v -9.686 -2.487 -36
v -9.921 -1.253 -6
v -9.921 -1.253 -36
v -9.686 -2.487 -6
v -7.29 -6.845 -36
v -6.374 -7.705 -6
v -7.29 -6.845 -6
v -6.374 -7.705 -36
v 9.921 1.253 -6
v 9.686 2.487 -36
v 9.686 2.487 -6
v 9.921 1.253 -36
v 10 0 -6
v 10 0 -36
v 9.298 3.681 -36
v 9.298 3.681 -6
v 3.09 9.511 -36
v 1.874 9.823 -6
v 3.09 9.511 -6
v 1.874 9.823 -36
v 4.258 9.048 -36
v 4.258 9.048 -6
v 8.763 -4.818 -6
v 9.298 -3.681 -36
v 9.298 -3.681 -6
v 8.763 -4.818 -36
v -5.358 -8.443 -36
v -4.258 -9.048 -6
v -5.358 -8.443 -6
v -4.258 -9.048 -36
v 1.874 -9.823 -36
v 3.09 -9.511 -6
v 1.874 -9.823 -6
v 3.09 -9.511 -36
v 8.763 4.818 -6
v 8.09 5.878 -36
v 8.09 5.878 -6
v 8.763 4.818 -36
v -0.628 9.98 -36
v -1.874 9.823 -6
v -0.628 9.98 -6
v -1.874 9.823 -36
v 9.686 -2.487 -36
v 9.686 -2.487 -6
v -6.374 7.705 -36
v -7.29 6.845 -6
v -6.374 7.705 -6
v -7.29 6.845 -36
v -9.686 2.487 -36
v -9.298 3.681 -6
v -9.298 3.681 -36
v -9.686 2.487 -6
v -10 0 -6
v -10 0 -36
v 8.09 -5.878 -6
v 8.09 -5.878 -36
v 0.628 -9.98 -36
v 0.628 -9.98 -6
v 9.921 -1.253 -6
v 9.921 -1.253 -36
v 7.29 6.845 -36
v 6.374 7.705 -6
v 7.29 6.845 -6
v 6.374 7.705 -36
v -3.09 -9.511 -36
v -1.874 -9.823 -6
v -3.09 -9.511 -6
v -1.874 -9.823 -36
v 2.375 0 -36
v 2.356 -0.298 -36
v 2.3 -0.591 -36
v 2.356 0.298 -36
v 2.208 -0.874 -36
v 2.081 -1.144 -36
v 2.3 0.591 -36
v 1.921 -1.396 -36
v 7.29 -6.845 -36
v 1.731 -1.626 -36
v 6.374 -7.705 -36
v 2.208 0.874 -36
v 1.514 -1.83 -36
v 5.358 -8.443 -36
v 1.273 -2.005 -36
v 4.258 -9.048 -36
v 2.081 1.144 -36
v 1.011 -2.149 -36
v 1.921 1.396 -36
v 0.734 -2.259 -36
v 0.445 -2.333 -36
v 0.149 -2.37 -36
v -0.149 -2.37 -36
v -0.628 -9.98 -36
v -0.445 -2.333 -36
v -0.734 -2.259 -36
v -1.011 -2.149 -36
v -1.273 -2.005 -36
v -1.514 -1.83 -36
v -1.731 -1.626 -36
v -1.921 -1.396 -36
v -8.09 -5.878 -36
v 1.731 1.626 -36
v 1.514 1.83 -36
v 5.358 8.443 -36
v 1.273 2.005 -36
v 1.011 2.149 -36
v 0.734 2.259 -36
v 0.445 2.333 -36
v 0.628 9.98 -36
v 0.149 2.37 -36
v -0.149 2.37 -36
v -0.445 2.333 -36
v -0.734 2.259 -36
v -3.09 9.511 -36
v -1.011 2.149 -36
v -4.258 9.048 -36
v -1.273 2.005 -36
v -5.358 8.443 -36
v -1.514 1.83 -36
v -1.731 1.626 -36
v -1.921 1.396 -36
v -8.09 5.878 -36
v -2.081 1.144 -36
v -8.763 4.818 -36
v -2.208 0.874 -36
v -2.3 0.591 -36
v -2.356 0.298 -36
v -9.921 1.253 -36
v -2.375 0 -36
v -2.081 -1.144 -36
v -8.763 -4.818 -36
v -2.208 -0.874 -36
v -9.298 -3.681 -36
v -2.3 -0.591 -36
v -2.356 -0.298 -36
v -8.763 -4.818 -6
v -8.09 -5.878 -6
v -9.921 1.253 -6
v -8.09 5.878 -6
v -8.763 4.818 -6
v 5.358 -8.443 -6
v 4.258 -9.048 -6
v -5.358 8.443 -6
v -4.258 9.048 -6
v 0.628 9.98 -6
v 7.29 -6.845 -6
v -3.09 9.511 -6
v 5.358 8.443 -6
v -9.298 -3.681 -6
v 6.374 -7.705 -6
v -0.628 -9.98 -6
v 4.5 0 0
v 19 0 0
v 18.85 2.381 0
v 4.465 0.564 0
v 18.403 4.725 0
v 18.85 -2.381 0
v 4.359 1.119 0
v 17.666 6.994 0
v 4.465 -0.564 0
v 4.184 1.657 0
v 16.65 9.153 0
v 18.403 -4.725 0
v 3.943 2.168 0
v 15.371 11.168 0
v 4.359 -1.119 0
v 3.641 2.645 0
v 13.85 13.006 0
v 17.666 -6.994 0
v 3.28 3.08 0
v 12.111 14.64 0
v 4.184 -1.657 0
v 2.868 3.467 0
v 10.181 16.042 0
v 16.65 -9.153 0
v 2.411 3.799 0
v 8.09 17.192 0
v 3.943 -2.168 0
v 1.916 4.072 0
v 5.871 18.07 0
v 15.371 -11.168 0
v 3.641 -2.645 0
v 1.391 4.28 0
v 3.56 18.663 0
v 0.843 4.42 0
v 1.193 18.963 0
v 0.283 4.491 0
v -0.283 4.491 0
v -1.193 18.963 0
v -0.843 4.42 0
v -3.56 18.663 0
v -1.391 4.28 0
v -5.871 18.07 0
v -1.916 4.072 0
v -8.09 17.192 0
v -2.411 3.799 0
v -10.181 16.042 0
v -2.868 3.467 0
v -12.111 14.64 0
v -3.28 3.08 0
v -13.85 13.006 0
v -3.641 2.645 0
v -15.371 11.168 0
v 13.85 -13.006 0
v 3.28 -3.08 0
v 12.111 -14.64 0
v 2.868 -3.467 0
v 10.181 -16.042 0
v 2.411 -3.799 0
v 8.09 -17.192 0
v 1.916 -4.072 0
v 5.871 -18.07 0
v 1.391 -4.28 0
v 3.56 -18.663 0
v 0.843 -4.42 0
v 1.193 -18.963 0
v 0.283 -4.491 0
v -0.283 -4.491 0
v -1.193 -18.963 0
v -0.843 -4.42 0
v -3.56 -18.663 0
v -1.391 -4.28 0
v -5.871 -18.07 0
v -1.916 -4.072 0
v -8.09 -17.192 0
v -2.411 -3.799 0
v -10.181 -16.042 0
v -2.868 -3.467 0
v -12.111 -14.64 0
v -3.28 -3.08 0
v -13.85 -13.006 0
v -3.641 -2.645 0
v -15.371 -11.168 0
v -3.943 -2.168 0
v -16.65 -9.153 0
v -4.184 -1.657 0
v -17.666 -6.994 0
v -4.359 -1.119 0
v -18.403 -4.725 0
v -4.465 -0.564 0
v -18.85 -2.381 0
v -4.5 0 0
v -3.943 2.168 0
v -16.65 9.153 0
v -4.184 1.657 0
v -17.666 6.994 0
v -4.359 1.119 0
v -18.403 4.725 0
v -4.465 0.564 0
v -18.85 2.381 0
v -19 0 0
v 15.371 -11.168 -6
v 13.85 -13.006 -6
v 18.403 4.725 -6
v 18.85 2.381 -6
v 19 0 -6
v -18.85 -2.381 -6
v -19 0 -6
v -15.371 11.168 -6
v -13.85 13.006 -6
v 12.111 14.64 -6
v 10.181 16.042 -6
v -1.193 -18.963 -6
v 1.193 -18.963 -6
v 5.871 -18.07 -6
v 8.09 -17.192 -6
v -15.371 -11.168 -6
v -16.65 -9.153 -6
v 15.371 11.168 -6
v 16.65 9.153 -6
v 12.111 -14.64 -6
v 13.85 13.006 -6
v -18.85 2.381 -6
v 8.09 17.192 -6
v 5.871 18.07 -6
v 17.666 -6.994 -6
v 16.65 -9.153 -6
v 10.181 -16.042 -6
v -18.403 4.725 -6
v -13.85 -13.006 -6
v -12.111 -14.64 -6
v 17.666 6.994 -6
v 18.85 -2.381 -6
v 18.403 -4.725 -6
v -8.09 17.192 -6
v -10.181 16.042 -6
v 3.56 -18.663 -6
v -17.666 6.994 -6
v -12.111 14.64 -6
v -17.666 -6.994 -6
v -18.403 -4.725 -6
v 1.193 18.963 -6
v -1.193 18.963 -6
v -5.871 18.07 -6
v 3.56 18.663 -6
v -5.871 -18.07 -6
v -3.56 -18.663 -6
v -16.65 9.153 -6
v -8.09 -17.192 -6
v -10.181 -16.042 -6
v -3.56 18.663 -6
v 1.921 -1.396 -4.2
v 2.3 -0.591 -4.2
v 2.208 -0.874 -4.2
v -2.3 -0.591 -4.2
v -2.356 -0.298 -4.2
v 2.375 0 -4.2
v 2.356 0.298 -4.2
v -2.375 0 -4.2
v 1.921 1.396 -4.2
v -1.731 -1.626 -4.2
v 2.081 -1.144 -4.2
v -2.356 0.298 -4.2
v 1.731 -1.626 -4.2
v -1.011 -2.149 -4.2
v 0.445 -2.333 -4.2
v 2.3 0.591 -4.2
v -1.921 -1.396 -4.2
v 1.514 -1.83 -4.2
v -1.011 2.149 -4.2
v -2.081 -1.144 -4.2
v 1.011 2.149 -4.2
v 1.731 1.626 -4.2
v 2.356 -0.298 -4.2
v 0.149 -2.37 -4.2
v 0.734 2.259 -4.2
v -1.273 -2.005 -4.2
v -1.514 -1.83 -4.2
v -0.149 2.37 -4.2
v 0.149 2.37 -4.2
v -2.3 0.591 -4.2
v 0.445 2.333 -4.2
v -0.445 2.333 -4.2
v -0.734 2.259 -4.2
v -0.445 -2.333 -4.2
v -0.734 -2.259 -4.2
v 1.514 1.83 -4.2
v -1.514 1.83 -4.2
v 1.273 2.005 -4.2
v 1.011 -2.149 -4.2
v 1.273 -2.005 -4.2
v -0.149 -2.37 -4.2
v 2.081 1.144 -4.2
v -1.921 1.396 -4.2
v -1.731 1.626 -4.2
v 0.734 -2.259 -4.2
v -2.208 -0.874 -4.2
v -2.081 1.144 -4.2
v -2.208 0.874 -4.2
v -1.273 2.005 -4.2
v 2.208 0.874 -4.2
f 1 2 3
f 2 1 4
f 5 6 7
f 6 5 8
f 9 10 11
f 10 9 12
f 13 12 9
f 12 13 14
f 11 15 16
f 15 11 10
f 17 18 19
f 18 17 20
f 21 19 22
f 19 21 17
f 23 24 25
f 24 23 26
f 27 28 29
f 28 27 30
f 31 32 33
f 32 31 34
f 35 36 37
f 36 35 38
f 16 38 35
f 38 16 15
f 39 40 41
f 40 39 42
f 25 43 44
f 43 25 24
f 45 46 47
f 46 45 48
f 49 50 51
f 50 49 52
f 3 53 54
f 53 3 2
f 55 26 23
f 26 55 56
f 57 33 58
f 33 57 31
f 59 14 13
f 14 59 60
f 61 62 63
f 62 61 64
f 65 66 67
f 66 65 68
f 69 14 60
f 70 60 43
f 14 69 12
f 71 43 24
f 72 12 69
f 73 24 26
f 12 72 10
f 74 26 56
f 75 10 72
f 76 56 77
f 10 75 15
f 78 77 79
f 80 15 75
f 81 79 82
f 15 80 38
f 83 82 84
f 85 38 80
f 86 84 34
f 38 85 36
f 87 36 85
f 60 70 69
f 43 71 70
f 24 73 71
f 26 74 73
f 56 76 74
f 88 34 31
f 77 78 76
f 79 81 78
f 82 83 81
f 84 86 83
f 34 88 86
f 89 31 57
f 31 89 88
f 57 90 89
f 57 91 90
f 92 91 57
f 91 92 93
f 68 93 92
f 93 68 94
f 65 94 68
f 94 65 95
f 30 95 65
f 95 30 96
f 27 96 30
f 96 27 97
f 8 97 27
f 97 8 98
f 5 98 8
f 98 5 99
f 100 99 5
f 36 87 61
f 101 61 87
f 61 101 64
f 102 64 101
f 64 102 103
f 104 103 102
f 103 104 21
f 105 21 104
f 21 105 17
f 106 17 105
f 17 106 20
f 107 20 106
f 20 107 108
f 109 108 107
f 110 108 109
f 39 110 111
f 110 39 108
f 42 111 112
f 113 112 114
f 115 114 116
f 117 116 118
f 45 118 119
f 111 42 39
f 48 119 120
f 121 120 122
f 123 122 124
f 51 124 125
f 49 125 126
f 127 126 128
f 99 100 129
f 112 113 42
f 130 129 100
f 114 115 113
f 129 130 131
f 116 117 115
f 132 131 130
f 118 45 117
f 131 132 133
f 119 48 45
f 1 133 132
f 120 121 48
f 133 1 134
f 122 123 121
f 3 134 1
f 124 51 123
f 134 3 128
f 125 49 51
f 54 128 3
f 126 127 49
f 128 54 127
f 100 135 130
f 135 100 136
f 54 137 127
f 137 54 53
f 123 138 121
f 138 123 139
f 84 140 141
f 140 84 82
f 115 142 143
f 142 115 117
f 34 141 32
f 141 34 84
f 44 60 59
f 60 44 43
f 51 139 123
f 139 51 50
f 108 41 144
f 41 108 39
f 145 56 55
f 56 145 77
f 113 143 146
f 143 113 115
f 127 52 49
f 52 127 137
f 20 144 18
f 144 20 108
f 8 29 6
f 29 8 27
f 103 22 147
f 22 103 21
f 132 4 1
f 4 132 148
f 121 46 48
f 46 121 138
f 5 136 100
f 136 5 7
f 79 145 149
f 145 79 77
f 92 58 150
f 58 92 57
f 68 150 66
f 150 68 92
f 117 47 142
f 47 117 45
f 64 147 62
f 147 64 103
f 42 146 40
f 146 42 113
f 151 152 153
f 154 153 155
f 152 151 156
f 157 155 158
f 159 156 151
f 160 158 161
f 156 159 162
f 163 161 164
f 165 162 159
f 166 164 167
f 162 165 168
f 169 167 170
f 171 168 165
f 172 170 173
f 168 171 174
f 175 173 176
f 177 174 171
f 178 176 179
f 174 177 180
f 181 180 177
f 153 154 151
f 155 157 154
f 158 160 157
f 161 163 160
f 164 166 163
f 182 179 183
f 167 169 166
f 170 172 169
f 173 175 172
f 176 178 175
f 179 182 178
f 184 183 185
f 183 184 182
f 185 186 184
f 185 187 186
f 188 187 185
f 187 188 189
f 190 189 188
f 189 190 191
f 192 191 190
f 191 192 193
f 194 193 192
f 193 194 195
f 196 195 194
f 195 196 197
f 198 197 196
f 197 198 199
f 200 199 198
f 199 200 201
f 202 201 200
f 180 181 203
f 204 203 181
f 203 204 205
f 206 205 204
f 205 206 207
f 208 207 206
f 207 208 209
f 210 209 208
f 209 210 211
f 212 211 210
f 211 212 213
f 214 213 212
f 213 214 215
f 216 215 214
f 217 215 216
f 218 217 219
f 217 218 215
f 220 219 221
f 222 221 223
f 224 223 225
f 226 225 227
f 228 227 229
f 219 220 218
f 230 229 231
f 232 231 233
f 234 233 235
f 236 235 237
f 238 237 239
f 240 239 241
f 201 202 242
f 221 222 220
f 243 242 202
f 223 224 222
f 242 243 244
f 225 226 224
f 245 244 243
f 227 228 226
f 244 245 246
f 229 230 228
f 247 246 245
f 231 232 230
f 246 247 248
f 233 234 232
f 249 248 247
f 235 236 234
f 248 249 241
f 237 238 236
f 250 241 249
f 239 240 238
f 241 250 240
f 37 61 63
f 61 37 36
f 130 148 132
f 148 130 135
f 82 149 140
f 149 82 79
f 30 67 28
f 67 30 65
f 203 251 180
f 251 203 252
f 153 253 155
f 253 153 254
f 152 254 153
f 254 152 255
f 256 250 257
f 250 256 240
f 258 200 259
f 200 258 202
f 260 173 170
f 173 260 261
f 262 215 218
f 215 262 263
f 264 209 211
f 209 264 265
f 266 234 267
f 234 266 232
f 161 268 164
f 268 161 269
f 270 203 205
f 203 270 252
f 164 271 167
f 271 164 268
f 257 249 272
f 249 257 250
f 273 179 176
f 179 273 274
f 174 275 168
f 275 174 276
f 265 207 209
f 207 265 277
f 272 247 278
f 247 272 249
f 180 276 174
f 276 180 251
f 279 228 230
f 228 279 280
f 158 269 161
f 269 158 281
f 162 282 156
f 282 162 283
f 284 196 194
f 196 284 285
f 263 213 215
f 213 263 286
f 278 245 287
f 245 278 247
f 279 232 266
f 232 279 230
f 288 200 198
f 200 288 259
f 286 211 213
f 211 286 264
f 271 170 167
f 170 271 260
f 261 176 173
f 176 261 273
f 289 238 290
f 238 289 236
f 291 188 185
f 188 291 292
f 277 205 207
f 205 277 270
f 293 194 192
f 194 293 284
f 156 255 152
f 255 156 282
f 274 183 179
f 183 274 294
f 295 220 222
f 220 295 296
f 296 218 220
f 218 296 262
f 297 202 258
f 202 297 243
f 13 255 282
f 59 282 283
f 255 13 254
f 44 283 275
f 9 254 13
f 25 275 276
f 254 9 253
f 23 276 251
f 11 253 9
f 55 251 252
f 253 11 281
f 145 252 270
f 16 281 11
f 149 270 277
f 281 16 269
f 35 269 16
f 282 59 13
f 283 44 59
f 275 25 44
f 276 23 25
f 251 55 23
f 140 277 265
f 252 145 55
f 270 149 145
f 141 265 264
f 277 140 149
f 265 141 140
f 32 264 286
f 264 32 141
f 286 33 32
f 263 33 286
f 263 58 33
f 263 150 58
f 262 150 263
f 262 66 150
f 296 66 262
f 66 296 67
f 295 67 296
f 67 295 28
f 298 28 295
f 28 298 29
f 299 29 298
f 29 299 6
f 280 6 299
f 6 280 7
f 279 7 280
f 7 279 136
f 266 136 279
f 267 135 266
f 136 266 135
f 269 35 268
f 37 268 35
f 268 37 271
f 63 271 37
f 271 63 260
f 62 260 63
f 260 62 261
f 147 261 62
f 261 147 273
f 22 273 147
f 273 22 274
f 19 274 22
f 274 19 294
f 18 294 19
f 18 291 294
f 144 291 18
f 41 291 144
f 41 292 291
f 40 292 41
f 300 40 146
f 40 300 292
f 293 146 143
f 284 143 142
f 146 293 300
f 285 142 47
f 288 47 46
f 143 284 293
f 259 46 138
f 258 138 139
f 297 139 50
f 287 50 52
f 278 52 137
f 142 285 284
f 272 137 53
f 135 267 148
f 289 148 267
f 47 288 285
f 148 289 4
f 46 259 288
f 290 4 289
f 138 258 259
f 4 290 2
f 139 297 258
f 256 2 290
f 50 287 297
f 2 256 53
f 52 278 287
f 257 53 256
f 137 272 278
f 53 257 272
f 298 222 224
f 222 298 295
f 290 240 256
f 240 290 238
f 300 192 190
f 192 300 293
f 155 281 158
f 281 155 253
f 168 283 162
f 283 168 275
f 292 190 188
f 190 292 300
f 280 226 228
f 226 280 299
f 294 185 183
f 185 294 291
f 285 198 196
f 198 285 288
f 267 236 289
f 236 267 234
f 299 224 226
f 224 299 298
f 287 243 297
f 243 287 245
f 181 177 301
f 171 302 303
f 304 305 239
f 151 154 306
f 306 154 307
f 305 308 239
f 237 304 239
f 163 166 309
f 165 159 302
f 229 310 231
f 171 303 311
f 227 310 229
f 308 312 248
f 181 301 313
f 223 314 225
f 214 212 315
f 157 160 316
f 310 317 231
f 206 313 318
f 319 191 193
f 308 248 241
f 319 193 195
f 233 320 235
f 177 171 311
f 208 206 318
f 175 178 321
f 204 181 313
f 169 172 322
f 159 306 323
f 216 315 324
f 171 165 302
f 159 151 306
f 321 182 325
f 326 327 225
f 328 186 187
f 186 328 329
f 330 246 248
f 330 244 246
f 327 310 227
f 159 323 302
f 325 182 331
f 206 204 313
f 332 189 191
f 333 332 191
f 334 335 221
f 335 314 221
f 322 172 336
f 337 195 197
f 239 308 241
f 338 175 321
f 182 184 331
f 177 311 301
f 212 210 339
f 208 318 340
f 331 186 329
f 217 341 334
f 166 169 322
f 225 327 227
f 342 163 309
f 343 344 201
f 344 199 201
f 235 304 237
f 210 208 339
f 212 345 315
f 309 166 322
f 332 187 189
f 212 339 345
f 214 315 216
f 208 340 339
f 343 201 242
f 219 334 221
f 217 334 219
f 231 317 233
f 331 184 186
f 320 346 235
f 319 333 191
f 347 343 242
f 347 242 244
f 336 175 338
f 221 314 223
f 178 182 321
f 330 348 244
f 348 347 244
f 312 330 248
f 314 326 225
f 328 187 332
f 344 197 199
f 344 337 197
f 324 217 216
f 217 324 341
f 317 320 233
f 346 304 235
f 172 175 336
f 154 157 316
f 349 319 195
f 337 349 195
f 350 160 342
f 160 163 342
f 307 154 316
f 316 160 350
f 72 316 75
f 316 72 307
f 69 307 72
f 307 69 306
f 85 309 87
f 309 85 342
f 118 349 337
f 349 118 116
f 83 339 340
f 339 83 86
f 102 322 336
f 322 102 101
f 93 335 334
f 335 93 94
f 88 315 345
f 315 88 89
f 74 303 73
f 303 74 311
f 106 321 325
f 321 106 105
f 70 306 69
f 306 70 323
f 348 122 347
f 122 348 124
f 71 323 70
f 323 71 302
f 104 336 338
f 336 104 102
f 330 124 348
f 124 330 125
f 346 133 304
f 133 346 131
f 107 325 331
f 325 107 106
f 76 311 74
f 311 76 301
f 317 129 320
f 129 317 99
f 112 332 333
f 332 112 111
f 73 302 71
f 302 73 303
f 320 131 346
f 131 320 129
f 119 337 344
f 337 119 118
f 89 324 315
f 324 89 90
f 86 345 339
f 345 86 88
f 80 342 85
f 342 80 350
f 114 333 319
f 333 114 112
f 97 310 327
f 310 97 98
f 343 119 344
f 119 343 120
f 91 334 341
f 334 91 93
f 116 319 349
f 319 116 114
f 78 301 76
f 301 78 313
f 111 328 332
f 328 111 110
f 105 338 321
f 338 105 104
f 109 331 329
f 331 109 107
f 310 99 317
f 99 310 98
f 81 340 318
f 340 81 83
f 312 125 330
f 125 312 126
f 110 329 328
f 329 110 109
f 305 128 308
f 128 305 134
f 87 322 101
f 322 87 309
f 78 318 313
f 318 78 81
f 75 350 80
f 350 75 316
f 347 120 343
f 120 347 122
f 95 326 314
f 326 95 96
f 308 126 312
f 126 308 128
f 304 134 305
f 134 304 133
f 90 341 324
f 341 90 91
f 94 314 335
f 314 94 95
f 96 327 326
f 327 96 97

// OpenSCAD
$fn = 50;


difference() {
	union() {
		translate(v = [0, 0, -36.0000000000]) {
			cylinder(h = 36, r = 10.0000000000);
		}
		translate(v = [0, 0, -6.0000000000]) {
			cylinder(h = 6, r = 19.0000000000);
		}
	}
	union() {
		translate(v = [0, 0, 0]) {
			rotate(a = [0, 0, 0]) {
				difference() {
					union() {
						#translate(v = [0, 0, -36.0000000000]) {
							cylinder(h = 36, r = 2.2500000000);
						}
						#translate(v = [0, 0, -4.2000000000]) {
							cylinder(h = 4.2000000000, r1 = 2.3750000000, r2 = 4.5000000000);
						}
						#translate(v = [0, 0, -36.0000000000]) {
							cylinder(h = 36, r = 2.3750000000);
						}
						#translate(v = [0, 0, -36.0000000000]) {
							cylinder(h = 36, r = 2.2500000000);
						}
					}
					union();
				}
			}
		}
	}
}
